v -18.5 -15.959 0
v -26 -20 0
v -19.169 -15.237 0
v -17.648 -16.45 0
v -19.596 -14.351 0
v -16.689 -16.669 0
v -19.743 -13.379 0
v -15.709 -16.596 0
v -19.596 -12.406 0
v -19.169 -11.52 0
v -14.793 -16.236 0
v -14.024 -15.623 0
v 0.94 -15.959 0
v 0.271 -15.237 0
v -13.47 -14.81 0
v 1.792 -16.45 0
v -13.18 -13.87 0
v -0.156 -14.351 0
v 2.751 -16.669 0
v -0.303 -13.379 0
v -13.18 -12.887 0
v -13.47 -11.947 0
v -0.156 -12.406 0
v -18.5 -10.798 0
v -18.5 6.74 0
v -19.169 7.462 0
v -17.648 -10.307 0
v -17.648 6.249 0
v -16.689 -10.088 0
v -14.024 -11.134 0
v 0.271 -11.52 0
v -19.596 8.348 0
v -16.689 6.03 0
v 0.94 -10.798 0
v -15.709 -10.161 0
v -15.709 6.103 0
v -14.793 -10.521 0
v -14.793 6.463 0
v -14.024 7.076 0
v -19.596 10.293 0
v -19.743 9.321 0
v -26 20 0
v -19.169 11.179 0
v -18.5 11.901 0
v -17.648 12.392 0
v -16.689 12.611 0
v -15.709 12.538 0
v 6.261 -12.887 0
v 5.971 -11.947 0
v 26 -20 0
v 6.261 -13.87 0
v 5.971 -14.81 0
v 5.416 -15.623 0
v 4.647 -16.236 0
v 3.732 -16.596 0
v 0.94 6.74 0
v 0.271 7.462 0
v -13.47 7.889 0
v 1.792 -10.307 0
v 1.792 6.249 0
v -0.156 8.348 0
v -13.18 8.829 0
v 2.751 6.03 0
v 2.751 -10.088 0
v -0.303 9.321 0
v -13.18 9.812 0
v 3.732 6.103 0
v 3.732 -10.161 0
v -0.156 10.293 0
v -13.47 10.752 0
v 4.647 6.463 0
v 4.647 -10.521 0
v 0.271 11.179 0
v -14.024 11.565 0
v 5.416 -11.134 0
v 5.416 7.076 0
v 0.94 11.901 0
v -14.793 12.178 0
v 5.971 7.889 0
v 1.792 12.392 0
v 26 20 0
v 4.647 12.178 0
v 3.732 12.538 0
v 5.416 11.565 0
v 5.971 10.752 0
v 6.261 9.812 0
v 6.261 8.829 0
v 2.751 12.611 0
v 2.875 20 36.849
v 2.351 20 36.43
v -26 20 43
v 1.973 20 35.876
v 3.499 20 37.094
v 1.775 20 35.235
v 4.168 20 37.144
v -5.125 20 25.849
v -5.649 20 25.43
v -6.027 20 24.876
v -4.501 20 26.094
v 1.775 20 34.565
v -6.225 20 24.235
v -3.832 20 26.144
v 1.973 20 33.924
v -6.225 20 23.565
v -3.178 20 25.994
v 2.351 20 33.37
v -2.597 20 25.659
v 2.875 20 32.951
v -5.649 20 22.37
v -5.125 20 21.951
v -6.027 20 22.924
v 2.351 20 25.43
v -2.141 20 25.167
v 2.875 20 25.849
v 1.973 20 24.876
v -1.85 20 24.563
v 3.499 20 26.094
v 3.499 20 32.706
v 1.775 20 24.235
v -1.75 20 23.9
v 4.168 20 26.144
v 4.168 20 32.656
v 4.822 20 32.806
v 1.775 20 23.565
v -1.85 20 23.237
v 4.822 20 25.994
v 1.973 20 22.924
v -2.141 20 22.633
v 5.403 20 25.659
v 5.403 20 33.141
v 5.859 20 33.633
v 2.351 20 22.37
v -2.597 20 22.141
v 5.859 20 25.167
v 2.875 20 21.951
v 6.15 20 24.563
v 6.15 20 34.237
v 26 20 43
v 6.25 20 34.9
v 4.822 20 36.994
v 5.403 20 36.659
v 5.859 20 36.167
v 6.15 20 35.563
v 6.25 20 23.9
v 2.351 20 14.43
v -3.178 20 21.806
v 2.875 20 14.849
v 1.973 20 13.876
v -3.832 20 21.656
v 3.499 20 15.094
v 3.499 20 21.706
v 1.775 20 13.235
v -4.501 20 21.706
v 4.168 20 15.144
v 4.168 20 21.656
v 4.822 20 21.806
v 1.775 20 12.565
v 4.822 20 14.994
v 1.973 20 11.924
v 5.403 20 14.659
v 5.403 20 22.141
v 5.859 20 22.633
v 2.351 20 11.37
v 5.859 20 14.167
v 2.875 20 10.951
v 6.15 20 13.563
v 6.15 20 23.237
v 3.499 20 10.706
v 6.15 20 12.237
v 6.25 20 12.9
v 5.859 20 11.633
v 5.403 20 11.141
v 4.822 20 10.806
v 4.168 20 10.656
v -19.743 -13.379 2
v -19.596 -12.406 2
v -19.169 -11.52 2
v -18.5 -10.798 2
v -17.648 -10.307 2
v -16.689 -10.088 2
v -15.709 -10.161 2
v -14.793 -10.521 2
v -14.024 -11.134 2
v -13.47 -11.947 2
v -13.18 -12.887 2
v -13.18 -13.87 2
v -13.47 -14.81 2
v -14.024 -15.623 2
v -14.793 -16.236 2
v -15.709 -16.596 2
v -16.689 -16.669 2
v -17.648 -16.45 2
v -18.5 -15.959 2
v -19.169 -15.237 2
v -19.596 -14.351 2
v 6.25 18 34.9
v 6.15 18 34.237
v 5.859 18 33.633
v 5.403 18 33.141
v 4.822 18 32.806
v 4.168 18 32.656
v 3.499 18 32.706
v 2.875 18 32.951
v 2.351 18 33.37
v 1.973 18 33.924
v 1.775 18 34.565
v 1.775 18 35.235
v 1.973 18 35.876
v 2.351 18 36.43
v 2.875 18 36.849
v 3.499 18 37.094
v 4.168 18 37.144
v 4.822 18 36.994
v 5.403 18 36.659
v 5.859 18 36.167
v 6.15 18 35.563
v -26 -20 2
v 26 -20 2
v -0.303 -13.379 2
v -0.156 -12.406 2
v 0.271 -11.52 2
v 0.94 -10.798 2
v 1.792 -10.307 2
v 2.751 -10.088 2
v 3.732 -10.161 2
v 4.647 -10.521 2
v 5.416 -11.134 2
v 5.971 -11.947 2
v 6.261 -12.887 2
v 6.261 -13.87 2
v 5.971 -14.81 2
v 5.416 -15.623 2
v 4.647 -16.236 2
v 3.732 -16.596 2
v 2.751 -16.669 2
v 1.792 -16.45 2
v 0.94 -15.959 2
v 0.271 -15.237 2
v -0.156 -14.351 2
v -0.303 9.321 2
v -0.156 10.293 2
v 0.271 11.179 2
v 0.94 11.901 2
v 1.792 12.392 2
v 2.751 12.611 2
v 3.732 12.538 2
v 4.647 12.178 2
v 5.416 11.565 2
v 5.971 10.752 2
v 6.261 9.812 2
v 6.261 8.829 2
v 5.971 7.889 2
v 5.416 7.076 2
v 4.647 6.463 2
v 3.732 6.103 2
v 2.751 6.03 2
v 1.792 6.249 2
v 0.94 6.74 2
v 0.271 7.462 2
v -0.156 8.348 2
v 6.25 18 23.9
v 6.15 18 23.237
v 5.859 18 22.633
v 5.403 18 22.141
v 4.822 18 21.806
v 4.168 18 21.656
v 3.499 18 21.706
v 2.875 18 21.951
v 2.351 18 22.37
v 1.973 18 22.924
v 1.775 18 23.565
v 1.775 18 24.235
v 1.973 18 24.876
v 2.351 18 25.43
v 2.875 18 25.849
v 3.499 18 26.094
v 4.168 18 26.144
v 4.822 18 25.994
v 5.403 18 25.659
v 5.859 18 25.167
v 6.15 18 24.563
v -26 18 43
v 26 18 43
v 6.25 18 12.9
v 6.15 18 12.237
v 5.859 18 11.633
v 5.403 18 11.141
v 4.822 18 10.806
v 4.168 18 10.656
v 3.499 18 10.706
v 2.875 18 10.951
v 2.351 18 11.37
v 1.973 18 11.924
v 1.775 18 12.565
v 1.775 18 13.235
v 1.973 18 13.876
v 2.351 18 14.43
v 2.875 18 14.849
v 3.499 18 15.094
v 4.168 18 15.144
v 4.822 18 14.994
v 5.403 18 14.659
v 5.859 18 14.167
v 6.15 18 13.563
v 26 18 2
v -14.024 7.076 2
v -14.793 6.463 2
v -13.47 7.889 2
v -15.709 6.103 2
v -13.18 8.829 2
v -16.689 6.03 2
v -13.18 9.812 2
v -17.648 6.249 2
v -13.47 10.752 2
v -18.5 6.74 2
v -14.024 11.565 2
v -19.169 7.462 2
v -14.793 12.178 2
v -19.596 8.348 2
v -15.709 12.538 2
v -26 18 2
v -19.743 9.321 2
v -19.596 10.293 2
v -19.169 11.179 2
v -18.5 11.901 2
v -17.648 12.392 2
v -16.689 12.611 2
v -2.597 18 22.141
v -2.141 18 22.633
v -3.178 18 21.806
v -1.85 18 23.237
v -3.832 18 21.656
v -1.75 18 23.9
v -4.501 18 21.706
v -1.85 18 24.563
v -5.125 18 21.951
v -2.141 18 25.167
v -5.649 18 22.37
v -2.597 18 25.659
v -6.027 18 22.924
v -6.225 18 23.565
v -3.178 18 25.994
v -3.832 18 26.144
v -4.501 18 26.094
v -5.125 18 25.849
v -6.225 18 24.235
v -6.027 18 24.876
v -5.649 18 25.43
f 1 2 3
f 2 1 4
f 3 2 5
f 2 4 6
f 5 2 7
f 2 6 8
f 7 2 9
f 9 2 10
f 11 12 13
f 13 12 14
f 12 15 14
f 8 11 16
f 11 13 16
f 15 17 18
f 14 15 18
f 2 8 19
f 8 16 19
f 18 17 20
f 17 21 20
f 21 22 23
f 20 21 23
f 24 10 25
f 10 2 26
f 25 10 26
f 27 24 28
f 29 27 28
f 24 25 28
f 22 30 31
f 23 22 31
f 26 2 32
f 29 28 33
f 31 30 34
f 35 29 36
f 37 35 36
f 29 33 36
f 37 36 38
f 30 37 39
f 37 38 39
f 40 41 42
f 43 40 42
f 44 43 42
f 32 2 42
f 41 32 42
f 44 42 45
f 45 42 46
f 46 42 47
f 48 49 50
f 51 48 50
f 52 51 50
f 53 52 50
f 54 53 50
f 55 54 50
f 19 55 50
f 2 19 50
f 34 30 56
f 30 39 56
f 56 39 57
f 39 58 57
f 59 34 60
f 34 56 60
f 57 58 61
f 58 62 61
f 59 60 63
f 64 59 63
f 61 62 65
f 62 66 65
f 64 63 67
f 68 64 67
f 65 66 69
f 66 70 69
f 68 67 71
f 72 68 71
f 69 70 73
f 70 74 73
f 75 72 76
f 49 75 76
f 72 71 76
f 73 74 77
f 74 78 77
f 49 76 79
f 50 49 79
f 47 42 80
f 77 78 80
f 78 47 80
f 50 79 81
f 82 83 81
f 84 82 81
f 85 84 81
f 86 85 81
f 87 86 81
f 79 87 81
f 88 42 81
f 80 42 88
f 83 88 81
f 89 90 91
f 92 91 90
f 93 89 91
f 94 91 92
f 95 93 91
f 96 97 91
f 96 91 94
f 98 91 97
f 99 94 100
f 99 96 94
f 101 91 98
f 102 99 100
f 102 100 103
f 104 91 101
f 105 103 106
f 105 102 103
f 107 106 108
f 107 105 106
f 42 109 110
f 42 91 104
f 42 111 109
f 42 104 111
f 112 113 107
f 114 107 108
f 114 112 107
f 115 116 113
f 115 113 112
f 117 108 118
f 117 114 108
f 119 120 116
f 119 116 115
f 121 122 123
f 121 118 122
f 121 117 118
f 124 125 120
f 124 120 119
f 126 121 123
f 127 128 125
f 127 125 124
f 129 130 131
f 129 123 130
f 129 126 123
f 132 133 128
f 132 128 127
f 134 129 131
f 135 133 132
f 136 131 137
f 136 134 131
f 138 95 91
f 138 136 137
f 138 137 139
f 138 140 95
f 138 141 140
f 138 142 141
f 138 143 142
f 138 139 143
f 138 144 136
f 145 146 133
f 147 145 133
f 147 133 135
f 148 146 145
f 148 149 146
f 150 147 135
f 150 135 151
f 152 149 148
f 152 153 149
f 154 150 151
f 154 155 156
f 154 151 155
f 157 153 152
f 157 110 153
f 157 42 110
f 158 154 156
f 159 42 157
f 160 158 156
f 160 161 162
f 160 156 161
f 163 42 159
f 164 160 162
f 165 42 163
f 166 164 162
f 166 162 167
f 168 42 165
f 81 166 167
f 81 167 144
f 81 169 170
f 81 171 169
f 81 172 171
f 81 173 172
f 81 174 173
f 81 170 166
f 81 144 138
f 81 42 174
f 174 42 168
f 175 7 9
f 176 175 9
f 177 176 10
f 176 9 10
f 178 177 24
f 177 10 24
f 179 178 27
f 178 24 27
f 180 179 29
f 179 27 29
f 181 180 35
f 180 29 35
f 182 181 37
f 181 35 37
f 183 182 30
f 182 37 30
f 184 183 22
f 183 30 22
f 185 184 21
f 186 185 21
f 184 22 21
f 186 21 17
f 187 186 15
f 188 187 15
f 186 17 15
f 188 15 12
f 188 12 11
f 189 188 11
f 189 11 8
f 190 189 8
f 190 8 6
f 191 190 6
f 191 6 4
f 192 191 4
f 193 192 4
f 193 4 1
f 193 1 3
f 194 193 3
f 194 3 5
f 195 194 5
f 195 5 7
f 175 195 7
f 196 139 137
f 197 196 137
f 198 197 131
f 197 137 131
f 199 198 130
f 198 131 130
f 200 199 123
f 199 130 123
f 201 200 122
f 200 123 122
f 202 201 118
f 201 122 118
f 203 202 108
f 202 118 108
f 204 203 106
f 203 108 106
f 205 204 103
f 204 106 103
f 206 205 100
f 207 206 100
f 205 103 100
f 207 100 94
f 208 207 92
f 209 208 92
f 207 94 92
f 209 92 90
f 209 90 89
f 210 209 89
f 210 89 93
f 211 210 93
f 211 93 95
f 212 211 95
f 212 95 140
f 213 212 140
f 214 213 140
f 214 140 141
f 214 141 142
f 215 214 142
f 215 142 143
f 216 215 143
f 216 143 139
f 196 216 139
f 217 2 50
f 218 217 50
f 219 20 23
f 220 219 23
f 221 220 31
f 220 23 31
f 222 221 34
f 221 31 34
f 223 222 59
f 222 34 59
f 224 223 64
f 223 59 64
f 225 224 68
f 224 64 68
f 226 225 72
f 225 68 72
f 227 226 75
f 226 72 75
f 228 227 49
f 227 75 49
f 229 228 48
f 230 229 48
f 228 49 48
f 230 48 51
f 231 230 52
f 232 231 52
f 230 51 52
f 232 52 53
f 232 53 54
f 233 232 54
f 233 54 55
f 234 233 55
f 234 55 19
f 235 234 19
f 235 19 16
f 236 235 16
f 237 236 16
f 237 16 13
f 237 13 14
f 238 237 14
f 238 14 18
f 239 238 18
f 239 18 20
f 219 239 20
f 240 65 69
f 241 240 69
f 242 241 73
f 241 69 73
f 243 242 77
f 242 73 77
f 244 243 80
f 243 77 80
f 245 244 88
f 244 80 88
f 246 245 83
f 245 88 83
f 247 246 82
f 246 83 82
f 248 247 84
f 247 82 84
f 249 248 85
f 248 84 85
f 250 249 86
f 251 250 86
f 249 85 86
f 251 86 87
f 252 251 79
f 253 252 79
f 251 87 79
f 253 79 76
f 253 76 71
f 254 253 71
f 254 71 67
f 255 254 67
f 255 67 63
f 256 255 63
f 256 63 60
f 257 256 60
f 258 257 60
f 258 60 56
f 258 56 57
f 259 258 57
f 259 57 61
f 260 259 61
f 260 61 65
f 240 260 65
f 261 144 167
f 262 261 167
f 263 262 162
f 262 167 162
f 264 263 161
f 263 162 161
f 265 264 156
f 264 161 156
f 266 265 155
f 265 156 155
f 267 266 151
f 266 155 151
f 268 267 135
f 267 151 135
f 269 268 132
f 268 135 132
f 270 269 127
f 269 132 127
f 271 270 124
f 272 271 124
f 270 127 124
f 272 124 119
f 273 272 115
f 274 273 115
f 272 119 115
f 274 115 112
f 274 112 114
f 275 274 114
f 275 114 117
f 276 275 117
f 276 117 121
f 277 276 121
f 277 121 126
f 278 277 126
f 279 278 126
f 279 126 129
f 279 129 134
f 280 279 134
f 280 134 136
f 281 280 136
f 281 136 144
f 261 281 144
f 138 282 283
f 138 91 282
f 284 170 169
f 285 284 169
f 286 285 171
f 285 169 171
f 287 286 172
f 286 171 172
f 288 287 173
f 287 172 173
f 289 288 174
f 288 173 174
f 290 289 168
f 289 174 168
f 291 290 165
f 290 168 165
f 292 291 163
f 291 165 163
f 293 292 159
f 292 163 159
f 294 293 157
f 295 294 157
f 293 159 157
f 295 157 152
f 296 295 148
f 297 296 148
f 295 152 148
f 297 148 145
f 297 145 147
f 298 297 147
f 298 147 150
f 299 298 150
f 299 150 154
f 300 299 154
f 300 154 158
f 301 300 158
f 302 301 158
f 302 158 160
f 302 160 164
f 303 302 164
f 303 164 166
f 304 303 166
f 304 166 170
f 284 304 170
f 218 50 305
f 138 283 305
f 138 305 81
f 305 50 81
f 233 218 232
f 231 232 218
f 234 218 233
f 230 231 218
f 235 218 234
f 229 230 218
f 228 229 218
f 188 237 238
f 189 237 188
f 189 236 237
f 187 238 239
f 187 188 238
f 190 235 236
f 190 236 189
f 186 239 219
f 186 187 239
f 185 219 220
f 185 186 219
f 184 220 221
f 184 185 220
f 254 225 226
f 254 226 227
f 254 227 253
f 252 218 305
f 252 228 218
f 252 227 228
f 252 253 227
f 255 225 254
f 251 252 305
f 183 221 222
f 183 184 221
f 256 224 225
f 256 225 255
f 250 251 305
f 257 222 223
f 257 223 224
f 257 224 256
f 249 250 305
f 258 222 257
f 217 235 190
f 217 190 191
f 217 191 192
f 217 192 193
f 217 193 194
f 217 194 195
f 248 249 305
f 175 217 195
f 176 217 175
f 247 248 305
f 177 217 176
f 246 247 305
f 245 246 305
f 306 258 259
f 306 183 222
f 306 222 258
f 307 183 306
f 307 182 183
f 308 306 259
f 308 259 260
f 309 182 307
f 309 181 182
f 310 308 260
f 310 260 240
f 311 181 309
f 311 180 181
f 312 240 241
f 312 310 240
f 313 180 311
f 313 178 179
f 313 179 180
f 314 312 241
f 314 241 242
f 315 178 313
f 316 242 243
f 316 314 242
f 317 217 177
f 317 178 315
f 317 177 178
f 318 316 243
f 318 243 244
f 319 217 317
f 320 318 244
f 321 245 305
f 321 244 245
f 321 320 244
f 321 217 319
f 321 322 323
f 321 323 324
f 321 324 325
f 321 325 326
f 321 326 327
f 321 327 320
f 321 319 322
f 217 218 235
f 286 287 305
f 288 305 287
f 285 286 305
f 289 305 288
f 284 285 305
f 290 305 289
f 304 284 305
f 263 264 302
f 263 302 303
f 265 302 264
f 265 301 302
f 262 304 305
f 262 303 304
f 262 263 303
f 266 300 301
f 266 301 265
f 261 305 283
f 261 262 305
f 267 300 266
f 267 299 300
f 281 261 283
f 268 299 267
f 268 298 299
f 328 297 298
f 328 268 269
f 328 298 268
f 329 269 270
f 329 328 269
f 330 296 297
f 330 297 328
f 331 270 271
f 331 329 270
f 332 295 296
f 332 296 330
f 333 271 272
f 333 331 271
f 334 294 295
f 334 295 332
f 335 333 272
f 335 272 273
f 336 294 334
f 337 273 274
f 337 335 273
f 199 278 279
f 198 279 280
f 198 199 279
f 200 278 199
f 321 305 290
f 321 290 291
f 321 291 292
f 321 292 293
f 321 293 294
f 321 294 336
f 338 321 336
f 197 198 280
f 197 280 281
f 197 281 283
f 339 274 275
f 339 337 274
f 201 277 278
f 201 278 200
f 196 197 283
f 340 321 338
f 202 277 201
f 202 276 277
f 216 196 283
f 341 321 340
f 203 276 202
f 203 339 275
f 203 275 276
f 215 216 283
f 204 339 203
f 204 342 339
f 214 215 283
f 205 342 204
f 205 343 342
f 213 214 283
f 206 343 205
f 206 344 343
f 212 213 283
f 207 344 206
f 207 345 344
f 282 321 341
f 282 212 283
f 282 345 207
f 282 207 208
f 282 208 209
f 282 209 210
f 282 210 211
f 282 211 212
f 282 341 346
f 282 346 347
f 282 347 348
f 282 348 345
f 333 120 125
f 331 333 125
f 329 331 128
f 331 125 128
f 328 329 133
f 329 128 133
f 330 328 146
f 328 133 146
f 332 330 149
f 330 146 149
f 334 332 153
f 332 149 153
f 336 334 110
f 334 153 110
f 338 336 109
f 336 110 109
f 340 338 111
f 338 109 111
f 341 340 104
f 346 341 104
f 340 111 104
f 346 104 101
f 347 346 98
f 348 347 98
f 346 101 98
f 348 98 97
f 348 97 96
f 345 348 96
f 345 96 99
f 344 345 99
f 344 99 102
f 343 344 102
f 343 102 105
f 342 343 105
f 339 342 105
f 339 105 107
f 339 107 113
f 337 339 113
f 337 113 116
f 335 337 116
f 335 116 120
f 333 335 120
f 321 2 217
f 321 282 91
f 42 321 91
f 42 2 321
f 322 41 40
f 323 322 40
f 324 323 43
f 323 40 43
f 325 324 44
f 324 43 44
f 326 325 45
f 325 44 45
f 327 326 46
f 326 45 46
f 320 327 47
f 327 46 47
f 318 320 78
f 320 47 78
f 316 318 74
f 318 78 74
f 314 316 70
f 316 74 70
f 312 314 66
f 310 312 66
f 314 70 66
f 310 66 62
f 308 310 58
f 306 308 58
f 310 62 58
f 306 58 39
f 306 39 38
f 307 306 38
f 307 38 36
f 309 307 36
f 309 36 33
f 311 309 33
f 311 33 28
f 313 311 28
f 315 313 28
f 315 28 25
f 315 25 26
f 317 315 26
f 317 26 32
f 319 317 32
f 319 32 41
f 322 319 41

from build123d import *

# Parameters (mm, degrees)
ESQUISSE1_W             = 52
ESQUISSE1_H             = 40
BOSS_EXTRU_1_DEPTH      = 43
ESQUISSE2_W             = 48.222048012
ESQUISSE2_H             = 36
ENL_V_MAT_EXTRU_1_DEPTH = 50
ESQUISSE3_W             = 72.686110251
ESQUISSE3_H             = 50.534375484
ENL_V_MAT_EXTRU_2_DEPTH = 38
D_GAGEMENT_M61_D        = 6.6
D_GAGEMENT_M41_D        = 4.5


with BuildPart() as part:
    # Esquisse1 → Boss.-Extru.1 (new body)
    with BuildSketch(Plane.XY):
        Rectangle(ESQUISSE1_W, ESQUISSE1_H)
    extrude(amount=BOSS_EXTRU_1_DEPTH)

    # Esquisse2 → Enlèv. mat.-Extru.1 (cut)
    with BuildSketch(Plane.ZY.offset(26)):
        with Locations((26.111024006, 0)):
            Rectangle(ESQUISSE2_W, ESQUISSE2_H)
    extrude(amount=-ENL_V_MAT_EXTRU_1_DEPTH, mode=Mode.SUBTRACT)

    # Esquisse3 → Enlèv. mat.-Extru.2 (cut)
    with BuildSketch(Plane.XZ.offset(20)):
        with Locations((1.657877156, 27.267187742)):
            Rectangle(ESQUISSE3_W, ESQUISSE3_H)
    extrude(amount=-ENL_V_MAT_EXTRU_2_DEPTH, mode=Mode.SUBTRACT)

    # Dégagement M61 (through all)
    with Locations(Plane.XY.offset(2)):
        with Locations((2.997387754, 9.32052376), (-16.442863145, 9.32052376), (-16.442863145, -13.378539167), (2.997387754, -13.378539167)):
            Hole(D_GAGEMENT_M61_D / 2)

    # Dégagement M41 (through all)
    with Locations(Plane(origin=(0, 18, 0), x_dir=(-1, 0, 0), z_dir=(0, -1, 0))):
        with Locations((-4, -34.9), (-4, -23.9), (-4, -12.9), (4, -23.9)):
            Hole(D_GAGEMENT_M41_D / 2)


solid = part.part
